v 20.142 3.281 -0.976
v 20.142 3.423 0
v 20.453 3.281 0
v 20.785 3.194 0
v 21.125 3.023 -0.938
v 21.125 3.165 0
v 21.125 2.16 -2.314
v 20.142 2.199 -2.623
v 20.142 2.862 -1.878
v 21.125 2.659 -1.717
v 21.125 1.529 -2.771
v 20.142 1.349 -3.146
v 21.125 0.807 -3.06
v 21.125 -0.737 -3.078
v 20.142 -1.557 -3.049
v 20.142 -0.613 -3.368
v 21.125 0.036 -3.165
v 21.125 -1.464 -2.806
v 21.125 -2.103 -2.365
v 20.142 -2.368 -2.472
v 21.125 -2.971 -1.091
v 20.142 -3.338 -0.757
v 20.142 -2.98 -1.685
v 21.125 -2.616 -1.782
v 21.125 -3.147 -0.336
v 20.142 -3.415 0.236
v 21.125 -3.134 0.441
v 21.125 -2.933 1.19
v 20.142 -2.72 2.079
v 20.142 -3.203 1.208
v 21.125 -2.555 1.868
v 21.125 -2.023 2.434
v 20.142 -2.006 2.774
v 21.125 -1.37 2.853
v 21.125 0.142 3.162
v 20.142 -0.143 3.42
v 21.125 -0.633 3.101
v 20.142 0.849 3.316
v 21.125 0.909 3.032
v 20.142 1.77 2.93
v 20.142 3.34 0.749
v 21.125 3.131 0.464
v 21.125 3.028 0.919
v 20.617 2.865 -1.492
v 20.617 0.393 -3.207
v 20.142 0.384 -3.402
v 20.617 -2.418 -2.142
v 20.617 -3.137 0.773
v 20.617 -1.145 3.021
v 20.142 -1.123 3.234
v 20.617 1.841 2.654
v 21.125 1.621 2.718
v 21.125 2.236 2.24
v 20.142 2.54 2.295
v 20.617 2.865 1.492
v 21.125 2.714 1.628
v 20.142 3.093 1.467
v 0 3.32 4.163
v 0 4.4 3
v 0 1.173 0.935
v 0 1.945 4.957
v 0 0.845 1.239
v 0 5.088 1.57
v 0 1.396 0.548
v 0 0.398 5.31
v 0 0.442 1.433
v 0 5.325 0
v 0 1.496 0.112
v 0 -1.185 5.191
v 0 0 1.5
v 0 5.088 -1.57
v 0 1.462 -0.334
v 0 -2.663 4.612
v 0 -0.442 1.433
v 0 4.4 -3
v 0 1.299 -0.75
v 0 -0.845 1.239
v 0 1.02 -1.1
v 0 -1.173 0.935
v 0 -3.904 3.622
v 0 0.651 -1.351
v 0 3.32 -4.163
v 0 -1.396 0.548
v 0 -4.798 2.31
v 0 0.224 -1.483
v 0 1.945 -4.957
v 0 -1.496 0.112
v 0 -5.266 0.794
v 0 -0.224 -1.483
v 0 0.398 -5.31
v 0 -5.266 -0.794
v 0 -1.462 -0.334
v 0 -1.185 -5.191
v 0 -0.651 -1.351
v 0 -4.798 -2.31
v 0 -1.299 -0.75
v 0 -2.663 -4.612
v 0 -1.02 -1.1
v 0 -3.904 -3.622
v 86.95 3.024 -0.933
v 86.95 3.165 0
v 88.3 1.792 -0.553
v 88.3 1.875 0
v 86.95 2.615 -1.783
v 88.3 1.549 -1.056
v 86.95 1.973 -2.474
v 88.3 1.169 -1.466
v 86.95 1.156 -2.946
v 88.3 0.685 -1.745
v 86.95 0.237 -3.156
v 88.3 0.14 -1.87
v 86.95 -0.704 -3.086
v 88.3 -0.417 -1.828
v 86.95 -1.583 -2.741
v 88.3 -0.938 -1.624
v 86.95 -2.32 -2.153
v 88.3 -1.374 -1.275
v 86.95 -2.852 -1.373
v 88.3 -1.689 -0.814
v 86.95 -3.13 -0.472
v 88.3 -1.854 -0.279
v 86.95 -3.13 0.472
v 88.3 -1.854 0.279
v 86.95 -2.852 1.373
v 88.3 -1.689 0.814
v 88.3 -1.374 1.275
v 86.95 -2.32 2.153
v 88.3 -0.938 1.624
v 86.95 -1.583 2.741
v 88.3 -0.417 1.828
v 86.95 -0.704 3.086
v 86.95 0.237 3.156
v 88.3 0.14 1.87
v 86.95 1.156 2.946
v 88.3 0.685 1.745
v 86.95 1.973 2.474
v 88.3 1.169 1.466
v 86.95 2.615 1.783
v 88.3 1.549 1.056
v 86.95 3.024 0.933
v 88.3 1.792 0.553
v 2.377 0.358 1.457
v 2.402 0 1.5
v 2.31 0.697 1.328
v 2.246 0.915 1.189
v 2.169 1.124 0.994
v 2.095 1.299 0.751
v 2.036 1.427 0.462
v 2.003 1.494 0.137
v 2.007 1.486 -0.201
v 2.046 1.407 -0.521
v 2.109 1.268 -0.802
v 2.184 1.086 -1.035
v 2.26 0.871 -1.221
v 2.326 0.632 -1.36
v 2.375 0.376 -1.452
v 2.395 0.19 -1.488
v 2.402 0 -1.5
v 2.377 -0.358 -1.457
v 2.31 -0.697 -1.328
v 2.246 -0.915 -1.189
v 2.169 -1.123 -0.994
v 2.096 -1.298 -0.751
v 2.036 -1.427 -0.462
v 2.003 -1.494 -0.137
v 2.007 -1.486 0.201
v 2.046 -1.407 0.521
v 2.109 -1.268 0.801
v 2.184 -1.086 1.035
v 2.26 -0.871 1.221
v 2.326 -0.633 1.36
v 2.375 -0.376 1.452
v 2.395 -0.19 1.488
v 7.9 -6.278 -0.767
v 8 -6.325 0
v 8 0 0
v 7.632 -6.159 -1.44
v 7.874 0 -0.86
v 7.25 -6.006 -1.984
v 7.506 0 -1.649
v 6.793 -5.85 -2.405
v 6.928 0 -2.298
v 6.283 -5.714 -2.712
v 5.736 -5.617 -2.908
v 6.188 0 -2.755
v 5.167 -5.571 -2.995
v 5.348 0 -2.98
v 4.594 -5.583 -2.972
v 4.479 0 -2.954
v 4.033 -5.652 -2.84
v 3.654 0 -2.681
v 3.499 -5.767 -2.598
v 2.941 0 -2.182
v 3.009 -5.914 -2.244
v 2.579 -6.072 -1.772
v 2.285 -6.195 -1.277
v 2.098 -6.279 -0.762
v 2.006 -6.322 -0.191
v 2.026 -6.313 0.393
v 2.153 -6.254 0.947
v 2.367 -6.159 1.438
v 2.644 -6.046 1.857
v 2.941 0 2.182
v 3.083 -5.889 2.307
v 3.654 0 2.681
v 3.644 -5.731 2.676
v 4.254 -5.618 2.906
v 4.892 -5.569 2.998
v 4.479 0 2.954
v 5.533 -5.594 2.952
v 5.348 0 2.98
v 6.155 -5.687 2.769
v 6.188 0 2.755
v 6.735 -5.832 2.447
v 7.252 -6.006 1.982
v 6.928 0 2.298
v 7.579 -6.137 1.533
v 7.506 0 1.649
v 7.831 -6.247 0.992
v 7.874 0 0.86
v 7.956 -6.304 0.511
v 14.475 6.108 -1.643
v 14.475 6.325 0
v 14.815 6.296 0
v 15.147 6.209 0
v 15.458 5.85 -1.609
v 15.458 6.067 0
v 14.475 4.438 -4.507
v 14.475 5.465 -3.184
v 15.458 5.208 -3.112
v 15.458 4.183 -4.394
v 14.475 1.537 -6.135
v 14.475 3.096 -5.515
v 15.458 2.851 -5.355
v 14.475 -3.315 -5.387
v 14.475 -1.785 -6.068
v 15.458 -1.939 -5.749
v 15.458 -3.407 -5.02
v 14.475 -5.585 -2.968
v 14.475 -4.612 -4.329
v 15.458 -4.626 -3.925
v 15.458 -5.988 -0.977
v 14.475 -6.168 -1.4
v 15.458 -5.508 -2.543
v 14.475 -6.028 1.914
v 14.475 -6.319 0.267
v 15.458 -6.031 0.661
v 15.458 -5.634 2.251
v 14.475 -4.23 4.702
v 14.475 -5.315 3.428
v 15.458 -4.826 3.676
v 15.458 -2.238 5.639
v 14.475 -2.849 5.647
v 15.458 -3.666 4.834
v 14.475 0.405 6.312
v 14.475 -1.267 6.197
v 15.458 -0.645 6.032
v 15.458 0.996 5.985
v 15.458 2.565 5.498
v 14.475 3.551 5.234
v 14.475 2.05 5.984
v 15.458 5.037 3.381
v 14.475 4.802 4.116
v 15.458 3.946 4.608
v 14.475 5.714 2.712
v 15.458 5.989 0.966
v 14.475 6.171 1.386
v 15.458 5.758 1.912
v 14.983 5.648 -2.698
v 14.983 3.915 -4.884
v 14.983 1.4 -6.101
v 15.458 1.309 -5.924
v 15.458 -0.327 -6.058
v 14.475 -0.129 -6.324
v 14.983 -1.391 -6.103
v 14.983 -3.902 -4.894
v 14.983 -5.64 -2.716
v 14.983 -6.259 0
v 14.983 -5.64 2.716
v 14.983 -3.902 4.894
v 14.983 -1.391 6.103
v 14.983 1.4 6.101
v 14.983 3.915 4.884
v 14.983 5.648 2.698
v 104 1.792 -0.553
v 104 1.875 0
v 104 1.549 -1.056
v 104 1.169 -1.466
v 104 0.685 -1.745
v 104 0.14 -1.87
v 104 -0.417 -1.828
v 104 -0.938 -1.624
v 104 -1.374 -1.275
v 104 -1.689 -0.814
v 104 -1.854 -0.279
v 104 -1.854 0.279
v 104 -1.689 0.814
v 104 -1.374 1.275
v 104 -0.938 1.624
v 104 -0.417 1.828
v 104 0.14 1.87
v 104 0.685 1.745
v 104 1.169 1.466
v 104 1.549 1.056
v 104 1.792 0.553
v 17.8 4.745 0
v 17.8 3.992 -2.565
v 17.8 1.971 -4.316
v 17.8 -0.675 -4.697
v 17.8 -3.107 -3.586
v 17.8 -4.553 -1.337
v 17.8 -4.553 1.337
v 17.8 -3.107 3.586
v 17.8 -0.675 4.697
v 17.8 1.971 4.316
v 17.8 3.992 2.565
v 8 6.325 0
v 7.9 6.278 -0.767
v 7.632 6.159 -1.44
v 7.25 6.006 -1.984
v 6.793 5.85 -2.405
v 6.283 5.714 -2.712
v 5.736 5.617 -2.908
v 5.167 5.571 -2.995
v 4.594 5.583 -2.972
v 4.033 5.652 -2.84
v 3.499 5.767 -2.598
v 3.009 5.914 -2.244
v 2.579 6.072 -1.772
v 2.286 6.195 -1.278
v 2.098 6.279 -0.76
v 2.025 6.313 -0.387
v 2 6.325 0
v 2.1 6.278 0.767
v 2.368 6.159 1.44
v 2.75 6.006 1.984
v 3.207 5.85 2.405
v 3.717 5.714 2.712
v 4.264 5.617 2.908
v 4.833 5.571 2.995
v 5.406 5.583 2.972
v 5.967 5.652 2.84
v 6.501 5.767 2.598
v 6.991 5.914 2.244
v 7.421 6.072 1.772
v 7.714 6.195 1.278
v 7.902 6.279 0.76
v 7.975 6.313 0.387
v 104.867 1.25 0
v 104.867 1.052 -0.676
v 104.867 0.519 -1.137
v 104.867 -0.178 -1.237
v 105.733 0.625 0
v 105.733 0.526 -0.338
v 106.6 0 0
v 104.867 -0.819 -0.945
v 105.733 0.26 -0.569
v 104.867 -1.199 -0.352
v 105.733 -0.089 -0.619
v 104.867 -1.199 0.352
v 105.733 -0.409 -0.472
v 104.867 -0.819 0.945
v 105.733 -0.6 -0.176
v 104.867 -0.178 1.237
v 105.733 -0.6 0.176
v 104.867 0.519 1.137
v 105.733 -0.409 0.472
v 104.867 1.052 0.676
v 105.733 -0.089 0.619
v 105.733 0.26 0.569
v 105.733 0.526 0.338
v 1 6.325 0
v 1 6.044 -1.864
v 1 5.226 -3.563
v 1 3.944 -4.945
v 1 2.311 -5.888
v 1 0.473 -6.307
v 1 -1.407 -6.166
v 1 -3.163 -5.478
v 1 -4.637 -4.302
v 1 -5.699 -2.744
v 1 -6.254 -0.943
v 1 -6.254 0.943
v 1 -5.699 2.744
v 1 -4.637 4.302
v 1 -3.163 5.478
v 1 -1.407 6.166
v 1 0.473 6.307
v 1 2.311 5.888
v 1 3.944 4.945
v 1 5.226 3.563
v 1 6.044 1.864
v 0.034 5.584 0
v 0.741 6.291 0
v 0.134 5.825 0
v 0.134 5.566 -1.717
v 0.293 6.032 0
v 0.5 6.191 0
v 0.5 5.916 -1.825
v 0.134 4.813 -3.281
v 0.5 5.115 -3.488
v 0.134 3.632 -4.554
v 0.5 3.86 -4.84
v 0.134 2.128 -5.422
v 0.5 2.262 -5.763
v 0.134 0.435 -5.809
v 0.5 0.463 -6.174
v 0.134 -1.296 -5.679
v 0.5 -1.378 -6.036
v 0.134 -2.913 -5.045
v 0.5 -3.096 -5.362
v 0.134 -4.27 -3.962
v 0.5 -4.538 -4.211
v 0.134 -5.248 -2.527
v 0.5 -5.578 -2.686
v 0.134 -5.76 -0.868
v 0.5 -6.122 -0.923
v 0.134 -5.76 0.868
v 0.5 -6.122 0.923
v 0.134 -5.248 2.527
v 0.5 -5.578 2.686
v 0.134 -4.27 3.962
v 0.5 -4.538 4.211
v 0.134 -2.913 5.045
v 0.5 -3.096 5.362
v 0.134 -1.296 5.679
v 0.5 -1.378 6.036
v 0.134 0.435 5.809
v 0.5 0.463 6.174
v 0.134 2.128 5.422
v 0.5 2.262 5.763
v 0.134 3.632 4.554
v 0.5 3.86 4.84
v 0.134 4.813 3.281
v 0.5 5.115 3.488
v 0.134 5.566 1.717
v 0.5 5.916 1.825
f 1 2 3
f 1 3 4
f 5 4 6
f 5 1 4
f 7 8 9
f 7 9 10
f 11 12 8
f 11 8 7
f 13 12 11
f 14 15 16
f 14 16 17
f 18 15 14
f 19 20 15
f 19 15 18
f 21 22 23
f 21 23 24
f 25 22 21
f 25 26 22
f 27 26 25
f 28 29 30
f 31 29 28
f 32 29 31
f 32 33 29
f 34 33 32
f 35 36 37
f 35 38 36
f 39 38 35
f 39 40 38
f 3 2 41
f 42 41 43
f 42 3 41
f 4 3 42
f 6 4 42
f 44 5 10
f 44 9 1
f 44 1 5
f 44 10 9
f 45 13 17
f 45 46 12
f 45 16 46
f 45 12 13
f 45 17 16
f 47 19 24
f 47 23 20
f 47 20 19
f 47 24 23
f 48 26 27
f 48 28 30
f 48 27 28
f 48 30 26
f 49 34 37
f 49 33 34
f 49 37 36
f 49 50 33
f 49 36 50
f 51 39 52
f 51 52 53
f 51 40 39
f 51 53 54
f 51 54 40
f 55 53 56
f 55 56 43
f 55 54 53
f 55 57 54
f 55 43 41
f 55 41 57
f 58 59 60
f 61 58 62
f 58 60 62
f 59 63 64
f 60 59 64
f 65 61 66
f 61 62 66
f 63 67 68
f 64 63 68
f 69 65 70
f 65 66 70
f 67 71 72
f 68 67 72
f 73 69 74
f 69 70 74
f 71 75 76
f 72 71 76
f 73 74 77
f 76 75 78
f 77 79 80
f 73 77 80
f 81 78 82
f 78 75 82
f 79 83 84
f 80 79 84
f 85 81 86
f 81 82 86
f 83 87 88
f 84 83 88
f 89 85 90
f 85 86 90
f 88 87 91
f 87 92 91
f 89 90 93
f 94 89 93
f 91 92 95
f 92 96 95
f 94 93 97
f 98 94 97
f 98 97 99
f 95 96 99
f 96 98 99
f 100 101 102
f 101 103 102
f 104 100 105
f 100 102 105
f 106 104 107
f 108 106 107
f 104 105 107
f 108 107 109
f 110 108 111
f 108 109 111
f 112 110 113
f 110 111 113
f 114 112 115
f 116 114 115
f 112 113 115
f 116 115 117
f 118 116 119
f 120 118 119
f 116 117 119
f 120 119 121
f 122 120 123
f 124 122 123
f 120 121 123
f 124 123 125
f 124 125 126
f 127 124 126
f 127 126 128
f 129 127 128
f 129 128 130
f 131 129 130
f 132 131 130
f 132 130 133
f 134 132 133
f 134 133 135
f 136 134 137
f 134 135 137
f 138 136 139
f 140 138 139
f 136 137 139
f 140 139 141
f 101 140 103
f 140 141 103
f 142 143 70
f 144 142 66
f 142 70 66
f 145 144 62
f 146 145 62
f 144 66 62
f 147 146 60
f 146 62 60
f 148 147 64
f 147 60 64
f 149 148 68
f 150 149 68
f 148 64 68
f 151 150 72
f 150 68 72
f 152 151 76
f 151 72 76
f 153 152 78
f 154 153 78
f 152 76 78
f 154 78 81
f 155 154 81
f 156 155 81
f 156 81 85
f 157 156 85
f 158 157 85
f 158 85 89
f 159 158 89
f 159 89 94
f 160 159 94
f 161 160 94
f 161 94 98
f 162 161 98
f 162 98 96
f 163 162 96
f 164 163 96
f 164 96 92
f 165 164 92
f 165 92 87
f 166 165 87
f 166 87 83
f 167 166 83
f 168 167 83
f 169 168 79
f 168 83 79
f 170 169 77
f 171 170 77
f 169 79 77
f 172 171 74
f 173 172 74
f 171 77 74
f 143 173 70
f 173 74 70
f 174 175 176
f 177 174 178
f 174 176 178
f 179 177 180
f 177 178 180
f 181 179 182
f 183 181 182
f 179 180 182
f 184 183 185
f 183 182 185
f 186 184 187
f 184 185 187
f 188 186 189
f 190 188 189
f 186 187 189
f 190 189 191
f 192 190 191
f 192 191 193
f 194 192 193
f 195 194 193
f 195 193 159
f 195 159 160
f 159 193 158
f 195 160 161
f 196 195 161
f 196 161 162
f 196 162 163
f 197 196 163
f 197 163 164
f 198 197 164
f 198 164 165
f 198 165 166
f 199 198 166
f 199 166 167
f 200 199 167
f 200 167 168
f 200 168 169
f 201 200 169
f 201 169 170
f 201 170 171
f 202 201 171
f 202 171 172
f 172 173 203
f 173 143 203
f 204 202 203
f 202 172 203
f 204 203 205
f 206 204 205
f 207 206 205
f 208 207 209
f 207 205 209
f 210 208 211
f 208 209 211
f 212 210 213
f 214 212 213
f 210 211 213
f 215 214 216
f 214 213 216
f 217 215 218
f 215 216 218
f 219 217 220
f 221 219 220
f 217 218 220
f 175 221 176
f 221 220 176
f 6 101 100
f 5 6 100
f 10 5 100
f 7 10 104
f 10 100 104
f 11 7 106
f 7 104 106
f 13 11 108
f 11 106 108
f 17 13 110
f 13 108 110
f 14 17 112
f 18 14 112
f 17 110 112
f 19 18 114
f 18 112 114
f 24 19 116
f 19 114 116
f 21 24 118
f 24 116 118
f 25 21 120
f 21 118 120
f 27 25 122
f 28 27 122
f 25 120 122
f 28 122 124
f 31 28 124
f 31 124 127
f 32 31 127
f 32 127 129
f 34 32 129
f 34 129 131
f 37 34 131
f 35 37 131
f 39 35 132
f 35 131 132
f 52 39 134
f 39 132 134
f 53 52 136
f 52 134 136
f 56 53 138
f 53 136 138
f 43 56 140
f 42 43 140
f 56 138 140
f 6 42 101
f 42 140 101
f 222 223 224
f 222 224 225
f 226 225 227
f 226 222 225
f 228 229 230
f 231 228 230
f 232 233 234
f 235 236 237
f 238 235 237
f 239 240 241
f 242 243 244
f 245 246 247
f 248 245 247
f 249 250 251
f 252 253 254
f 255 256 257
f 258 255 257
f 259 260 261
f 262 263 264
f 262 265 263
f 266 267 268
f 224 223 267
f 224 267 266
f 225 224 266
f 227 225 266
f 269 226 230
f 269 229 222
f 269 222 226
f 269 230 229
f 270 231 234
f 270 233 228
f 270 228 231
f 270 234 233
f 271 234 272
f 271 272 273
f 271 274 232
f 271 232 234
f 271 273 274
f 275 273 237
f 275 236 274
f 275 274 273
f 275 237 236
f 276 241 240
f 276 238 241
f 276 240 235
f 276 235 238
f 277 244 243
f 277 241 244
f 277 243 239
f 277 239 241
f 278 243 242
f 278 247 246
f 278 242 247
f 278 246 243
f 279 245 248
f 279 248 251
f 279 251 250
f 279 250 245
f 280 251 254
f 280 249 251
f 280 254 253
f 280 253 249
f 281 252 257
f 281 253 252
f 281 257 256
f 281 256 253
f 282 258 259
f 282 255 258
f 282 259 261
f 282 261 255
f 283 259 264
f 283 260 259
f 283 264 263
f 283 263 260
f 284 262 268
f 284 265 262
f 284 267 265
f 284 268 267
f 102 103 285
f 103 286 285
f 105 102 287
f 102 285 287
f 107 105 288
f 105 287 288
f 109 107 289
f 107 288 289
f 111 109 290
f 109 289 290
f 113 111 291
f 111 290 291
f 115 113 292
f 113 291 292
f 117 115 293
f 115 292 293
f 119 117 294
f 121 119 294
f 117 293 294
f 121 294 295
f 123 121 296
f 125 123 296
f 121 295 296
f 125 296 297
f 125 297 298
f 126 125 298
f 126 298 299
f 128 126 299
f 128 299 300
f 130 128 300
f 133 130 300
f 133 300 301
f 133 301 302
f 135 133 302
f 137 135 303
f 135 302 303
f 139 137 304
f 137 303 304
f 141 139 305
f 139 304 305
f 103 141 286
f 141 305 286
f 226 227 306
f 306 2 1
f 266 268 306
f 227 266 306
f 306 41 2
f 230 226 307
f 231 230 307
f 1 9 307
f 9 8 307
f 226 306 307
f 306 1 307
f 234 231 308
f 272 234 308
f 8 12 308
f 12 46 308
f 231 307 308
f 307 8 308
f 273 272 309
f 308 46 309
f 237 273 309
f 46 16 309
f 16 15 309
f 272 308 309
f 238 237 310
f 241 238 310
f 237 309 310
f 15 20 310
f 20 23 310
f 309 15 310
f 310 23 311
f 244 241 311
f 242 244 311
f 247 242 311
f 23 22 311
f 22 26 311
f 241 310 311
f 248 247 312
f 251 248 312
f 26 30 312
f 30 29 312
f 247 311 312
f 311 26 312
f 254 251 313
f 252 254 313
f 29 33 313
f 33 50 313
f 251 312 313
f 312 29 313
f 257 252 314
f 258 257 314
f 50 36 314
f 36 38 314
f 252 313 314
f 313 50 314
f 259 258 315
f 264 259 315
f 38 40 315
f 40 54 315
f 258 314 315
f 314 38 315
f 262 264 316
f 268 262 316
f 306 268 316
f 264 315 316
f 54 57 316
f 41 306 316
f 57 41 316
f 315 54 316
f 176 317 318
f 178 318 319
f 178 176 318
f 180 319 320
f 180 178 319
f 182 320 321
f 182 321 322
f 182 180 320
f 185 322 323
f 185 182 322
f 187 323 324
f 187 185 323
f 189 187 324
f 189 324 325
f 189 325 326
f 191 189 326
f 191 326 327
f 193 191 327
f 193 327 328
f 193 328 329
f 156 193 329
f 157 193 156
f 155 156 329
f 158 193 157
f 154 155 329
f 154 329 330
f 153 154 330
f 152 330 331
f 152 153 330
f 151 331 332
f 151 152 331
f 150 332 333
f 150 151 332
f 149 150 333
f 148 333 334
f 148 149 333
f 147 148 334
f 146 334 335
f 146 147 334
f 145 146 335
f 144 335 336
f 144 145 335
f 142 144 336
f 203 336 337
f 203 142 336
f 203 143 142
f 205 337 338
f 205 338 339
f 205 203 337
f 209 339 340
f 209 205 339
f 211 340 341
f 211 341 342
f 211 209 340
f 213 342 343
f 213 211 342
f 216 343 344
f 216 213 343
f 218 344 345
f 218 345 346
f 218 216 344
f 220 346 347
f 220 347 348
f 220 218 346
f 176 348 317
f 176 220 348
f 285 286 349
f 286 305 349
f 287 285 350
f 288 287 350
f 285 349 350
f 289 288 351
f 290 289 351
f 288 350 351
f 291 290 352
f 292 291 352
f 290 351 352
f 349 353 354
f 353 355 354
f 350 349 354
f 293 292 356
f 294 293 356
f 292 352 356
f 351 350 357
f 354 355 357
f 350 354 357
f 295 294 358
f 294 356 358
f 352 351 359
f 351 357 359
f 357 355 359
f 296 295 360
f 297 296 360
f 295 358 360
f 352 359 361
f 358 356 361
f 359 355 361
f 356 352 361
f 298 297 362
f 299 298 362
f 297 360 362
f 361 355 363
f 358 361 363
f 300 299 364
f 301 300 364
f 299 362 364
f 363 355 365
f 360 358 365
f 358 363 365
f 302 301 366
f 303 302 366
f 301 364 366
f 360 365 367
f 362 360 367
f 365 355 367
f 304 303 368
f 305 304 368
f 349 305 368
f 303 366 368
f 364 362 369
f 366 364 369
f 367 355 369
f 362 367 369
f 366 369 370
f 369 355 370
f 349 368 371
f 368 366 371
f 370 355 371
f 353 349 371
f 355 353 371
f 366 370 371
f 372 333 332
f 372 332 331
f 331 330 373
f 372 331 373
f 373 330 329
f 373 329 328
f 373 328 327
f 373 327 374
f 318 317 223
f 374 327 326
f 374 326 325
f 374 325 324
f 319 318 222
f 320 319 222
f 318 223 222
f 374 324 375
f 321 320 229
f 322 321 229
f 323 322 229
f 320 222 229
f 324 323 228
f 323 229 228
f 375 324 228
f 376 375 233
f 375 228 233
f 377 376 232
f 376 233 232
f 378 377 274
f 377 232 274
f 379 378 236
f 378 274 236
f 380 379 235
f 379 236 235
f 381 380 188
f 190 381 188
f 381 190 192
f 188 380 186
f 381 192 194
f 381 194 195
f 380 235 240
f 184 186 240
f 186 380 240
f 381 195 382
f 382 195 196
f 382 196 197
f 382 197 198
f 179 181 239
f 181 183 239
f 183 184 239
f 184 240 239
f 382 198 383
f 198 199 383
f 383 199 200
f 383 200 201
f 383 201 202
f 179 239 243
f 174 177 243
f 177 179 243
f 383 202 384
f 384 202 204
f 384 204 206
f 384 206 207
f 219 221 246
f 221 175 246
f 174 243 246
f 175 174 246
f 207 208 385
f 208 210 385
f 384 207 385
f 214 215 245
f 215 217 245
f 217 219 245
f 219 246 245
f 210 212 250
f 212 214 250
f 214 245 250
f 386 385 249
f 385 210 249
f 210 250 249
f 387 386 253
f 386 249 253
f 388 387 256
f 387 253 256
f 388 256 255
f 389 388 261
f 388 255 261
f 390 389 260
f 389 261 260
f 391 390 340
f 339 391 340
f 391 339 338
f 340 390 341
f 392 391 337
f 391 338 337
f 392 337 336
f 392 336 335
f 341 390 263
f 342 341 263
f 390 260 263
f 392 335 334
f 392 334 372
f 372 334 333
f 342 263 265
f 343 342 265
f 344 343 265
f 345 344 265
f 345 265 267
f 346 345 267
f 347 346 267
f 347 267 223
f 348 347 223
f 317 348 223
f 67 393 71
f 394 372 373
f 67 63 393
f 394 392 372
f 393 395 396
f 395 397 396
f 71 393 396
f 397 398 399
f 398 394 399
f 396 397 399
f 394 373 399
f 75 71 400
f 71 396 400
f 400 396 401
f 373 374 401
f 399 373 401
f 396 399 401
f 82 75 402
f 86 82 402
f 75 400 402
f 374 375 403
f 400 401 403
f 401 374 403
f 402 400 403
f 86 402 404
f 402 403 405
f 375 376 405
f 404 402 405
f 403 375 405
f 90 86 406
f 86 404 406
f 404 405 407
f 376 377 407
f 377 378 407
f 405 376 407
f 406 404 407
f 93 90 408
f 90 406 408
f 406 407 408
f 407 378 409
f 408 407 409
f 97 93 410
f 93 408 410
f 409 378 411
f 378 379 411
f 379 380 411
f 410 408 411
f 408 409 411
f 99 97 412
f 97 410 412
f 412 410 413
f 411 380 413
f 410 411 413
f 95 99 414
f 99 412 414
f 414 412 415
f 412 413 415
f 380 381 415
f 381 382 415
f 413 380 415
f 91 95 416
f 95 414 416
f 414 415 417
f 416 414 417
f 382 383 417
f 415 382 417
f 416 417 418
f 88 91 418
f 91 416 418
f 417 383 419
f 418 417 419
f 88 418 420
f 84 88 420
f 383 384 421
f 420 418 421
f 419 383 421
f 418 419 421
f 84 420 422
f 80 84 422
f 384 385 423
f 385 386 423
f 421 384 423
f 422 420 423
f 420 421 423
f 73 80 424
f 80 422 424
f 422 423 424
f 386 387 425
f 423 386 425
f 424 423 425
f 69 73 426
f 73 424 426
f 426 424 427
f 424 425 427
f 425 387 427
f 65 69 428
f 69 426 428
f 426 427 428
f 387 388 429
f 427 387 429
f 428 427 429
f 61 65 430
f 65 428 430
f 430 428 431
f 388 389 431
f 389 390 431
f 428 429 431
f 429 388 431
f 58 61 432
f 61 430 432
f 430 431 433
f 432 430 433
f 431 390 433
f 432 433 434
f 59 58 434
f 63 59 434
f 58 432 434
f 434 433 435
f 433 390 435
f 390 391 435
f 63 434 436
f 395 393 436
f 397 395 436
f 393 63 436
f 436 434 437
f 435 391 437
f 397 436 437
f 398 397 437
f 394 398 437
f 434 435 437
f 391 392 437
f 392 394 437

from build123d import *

# Parameters (mm, degrees)
CUT_EXTRUDE1_DEPTH      = 10
CUT_EXTRUDE1_DEPTH_BACK = 10
SKETCH2_R               = 3
FILLET1_R               = 1
FILLET2_R               = 2
SKETCH3_R               = 1.5
CUT_EXTRUDE2_DEPTH      = 6


with BuildPart() as part:
    # Sketch1 → Revolve1 (revolve)
    with BuildSketch(Plane.XY):
        Polygon((0, 0), (0, 6.325), (15, 6.325), (20.6, 3.165), (86.95, 3.165), (88.3, 1.875), (104, 1.875), (106.6, 0), align=None)
    revolve(axis=Axis((106.6, 0, 0), (-1, 0, 0)))

    # Sketch2 → Cut-Extrude1 (cut, two sides: drawn at the far end of the back side and taken through both)
    with BuildSketch(Plane(origin=(0, 0, 0), x_dir=(1, 0, 0), z_dir=(0, 1, 0)).offset(-CUT_EXTRUDE1_DEPTH_BACK)):
        with Locations((5, 0)):
            Circle(SKETCH2_R)
    extrude(amount=CUT_EXTRUDE1_DEPTH + CUT_EXTRUDE1_DEPTH_BACK, mode=Mode.SUBTRACT)

    # Fillet1
    fillet1_edges = [part.edges().sort_by_distance(p)[0] for p in [
        (0, -6.325, 0),
    ]]
    fillet(fillet1_edges, radius=FILLET1_R)

    # Fillet2
    fillet2_edges = [part.edges().sort_by_distance(p)[0] for p in [
        (20.6, -3.165, 0),
        (15, -6.325, 0),
    ]]
    fillet(fillet2_edges, radius=FILLET2_R)

    # Sketch3 → Cut-Extrude2 (cut)
    with BuildSketch(Plane.ZY):
        Circle(SKETCH3_R)
    extrude(amount=-CUT_EXTRUDE2_DEPTH, mode=Mode.SUBTRACT)


solid = part.part
